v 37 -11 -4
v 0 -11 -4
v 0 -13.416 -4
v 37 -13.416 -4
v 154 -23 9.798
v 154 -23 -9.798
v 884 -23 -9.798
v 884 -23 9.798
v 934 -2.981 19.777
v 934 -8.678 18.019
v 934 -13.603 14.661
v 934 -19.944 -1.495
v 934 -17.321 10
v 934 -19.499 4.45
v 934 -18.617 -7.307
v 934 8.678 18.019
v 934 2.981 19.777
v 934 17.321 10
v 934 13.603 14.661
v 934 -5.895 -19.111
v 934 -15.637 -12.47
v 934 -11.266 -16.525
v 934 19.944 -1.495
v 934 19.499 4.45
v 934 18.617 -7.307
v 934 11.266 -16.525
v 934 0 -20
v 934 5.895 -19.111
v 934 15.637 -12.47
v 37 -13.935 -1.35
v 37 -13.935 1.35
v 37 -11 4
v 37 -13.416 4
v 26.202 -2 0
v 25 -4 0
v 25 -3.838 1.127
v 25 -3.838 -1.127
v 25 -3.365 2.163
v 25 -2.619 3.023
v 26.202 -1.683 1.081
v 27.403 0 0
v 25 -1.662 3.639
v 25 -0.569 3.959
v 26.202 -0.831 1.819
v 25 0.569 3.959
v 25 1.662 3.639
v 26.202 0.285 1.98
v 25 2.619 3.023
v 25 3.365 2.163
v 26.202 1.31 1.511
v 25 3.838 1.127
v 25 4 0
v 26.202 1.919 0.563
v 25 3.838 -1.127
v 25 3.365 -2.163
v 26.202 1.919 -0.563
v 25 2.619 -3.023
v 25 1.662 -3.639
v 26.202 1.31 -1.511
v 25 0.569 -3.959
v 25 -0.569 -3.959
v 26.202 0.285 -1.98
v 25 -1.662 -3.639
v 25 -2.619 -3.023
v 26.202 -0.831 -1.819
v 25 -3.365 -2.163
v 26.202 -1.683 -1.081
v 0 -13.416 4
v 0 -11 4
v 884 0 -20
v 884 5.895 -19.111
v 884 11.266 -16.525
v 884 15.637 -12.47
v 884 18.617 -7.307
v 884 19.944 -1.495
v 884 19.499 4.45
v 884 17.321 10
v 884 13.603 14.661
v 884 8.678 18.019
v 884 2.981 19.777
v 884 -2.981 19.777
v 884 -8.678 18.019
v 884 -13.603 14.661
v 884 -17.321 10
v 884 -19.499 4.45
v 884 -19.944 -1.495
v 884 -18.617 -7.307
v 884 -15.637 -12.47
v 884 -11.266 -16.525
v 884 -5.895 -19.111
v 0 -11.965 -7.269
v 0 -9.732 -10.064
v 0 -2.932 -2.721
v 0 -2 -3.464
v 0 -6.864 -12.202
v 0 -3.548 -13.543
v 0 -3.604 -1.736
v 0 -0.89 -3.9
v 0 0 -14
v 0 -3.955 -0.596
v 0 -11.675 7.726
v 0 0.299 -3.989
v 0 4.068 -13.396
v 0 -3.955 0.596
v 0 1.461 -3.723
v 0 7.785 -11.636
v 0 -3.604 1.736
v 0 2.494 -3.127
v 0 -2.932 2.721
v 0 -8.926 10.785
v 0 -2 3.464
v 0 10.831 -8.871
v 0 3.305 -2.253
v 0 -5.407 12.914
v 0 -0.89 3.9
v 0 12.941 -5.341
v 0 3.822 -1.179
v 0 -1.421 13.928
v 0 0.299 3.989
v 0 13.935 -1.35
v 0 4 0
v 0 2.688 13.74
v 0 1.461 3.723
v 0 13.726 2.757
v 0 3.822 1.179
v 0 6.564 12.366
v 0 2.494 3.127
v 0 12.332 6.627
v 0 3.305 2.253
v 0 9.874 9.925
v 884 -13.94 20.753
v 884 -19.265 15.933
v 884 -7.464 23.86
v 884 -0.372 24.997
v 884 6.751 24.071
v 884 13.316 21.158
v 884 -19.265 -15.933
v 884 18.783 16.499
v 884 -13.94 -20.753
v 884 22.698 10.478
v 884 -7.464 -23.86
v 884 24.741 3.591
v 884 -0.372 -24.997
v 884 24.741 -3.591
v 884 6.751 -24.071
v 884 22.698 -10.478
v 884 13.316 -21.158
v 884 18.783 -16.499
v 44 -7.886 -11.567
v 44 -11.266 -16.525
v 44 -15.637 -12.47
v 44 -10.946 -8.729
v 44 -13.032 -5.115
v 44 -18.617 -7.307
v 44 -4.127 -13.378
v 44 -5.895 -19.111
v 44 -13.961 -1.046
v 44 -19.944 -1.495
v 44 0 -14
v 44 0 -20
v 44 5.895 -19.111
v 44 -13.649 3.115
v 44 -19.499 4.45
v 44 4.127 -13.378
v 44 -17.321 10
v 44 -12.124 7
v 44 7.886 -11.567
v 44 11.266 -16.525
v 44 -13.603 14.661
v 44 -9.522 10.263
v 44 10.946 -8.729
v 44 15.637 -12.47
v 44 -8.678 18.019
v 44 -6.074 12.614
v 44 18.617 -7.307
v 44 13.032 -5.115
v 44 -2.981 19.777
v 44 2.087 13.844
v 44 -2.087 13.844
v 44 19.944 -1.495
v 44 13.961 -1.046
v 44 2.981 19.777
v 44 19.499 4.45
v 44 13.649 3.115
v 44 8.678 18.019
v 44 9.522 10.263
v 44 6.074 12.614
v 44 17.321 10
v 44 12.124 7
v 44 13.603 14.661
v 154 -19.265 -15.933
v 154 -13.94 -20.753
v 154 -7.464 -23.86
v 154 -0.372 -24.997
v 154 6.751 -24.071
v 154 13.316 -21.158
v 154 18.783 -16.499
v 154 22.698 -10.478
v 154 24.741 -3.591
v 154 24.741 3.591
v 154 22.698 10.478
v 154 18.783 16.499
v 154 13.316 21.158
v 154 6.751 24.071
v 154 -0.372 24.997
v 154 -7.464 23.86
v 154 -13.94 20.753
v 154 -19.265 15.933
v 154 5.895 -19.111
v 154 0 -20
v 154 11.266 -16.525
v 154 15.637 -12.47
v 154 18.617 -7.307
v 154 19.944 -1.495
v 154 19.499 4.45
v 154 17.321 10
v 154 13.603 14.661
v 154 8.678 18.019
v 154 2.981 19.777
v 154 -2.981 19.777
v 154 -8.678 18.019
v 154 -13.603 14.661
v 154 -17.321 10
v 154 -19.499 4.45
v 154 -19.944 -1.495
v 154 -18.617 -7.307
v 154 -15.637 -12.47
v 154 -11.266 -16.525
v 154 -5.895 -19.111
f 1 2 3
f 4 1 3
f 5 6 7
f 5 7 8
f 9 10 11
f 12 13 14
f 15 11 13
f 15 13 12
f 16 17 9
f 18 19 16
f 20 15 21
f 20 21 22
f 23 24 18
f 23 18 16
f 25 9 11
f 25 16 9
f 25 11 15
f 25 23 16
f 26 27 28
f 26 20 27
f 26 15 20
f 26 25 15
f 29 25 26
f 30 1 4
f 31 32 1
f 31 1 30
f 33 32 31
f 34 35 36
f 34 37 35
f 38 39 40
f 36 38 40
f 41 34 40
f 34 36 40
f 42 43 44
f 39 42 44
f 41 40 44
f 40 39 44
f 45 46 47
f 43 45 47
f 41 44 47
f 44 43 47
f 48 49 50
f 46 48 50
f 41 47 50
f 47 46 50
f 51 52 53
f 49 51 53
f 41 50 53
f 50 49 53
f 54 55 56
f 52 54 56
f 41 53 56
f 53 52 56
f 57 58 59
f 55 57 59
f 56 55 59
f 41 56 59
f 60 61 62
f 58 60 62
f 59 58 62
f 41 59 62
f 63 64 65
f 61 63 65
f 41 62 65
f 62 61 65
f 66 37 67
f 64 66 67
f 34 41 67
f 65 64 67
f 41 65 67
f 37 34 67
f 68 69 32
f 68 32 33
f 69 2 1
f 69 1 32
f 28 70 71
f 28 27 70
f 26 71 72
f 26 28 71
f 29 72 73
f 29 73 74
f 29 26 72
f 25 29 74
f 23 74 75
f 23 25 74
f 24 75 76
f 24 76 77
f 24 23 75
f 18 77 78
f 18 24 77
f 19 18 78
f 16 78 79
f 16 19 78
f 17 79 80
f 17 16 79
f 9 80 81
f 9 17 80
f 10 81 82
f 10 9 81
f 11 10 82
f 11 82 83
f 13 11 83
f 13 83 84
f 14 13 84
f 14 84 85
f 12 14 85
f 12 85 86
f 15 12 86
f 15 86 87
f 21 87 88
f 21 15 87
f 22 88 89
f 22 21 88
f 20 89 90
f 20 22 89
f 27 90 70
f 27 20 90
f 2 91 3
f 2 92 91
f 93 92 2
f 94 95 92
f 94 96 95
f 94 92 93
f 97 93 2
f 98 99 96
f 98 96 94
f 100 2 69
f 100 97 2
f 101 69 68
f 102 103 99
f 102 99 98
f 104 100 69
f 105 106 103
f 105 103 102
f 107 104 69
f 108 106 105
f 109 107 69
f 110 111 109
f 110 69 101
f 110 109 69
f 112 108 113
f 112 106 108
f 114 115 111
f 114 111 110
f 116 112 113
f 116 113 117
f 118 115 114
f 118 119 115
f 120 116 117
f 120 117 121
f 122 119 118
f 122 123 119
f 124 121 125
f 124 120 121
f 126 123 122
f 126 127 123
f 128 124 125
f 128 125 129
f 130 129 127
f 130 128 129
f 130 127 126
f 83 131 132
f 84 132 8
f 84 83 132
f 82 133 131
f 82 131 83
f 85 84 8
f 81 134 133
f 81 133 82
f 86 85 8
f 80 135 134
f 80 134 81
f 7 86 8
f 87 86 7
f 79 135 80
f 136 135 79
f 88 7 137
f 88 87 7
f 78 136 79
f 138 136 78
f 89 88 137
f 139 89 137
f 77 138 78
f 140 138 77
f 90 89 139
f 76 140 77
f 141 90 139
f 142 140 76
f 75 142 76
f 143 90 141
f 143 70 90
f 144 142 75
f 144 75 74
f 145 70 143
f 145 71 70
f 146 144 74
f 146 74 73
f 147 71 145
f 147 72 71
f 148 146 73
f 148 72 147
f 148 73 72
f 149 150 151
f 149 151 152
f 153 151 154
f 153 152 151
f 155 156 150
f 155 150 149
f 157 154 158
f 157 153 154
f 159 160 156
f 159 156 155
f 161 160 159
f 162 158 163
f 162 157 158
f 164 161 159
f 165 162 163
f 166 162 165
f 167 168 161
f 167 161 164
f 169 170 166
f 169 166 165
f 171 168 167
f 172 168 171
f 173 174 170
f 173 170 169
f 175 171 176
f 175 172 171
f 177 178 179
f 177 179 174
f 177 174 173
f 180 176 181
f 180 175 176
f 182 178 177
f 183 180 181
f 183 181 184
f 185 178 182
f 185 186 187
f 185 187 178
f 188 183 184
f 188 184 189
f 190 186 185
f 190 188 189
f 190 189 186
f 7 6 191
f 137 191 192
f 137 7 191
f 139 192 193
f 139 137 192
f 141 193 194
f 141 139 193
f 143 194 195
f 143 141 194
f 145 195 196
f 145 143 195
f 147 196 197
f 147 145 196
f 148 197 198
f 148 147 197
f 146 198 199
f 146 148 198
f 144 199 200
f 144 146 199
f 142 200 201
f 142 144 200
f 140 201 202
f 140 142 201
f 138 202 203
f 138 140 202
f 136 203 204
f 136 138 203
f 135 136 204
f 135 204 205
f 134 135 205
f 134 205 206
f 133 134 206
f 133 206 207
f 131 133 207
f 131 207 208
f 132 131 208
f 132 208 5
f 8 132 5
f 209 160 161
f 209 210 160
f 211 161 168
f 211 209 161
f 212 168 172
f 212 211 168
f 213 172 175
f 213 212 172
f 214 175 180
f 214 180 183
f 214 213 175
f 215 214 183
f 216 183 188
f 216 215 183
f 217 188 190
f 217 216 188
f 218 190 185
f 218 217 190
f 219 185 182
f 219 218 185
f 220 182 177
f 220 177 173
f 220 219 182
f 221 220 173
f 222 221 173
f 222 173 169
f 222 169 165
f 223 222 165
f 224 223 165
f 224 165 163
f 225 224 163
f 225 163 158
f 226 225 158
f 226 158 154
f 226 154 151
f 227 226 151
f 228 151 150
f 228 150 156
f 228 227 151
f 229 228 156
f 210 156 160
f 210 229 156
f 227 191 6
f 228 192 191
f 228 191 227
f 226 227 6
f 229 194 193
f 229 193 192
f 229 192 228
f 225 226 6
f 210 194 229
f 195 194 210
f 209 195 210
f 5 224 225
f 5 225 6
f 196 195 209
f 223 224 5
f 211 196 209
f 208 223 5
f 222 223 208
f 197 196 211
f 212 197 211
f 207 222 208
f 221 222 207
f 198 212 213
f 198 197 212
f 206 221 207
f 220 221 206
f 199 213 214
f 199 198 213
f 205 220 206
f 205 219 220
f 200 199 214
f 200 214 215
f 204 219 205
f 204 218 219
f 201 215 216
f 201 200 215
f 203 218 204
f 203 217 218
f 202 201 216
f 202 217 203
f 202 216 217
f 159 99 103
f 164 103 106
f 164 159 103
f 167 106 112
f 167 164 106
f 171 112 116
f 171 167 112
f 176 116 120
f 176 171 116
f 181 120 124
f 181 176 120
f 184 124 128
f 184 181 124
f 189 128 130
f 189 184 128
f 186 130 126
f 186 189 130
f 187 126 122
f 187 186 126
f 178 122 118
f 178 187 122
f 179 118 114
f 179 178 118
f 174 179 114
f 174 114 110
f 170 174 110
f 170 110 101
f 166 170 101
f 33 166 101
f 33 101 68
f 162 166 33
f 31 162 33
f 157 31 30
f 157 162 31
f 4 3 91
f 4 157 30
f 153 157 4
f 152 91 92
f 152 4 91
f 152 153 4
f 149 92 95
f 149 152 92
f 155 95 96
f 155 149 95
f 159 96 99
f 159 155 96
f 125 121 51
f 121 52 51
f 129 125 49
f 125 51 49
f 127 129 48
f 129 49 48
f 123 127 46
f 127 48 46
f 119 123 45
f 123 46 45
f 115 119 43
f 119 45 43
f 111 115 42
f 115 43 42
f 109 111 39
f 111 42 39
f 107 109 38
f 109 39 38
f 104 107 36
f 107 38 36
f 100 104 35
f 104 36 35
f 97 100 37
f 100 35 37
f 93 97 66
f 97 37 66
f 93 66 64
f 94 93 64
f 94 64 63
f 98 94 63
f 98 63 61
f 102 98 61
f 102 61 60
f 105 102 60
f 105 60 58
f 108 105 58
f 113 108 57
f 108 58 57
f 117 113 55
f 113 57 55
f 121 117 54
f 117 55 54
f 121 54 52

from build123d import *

# Parameters (mm, degrees)
F2_W     = 4
F2_H     = 8
F3_DEPTH = 37
F4_W     = 21.7020311332
F4_H     = 83.8147368835
F5_DEPTH = 752
F6_D     = 8
F6_DEPTH = 25
F6_TIP   = 2.4034424761


with BuildPart() as f1:
    # F0 (on Front) → F1 (revolve)
    with BuildSketch(Plane.XZ):
        Polygon((934, 0), (0, 0), (0, -14), (44, -14), (44, -20), (154, -20), (154, -25), (884, -25), (884, -20), (934, -20), align=None)
    revolve(axis=Axis((467, 0, 0), (1, 0, 0)))

    # F2 (on face) → F3 (cut)
    with BuildSketch(Plane(origin=(0, 0, 0), x_dir=(0, -1, 0), z_dir=(-1, 0, 0))):
        with Locations((13, 0)):
            Rectangle(F2_W, F2_H)
    extrude(amount=-F3_DEPTH, mode=Mode.SUBTRACT)

    # F4 (on face) → F5 (cut)
    with BuildSketch(Plane(origin=(154, 0, 0), x_dir=(0, -1, 0), z_dir=(-1, 0, 0))):
        with Locations((33.8510155666, -0.2332581207)):
            Rectangle(F4_W, F4_H)
    extrude(amount=-F5_DEPTH, mode=Mode.SUBTRACT)

    # F6
    with Locations(Plane(origin=(0, 0, 0), x_dir=(0, -1, 0), z_dir=(-1, 0, 0))):
        with Locations((0, 0)):
            Hole(F6_D / 2, depth=F6_DEPTH)
            with Locations((0, 0, -(F6_DEPTH + F6_TIP / 2))):  # 118° drill point
                Cone(0, F6_D / 2, F6_TIP, mode=Mode.SUBTRACT)


solid = f1.part
